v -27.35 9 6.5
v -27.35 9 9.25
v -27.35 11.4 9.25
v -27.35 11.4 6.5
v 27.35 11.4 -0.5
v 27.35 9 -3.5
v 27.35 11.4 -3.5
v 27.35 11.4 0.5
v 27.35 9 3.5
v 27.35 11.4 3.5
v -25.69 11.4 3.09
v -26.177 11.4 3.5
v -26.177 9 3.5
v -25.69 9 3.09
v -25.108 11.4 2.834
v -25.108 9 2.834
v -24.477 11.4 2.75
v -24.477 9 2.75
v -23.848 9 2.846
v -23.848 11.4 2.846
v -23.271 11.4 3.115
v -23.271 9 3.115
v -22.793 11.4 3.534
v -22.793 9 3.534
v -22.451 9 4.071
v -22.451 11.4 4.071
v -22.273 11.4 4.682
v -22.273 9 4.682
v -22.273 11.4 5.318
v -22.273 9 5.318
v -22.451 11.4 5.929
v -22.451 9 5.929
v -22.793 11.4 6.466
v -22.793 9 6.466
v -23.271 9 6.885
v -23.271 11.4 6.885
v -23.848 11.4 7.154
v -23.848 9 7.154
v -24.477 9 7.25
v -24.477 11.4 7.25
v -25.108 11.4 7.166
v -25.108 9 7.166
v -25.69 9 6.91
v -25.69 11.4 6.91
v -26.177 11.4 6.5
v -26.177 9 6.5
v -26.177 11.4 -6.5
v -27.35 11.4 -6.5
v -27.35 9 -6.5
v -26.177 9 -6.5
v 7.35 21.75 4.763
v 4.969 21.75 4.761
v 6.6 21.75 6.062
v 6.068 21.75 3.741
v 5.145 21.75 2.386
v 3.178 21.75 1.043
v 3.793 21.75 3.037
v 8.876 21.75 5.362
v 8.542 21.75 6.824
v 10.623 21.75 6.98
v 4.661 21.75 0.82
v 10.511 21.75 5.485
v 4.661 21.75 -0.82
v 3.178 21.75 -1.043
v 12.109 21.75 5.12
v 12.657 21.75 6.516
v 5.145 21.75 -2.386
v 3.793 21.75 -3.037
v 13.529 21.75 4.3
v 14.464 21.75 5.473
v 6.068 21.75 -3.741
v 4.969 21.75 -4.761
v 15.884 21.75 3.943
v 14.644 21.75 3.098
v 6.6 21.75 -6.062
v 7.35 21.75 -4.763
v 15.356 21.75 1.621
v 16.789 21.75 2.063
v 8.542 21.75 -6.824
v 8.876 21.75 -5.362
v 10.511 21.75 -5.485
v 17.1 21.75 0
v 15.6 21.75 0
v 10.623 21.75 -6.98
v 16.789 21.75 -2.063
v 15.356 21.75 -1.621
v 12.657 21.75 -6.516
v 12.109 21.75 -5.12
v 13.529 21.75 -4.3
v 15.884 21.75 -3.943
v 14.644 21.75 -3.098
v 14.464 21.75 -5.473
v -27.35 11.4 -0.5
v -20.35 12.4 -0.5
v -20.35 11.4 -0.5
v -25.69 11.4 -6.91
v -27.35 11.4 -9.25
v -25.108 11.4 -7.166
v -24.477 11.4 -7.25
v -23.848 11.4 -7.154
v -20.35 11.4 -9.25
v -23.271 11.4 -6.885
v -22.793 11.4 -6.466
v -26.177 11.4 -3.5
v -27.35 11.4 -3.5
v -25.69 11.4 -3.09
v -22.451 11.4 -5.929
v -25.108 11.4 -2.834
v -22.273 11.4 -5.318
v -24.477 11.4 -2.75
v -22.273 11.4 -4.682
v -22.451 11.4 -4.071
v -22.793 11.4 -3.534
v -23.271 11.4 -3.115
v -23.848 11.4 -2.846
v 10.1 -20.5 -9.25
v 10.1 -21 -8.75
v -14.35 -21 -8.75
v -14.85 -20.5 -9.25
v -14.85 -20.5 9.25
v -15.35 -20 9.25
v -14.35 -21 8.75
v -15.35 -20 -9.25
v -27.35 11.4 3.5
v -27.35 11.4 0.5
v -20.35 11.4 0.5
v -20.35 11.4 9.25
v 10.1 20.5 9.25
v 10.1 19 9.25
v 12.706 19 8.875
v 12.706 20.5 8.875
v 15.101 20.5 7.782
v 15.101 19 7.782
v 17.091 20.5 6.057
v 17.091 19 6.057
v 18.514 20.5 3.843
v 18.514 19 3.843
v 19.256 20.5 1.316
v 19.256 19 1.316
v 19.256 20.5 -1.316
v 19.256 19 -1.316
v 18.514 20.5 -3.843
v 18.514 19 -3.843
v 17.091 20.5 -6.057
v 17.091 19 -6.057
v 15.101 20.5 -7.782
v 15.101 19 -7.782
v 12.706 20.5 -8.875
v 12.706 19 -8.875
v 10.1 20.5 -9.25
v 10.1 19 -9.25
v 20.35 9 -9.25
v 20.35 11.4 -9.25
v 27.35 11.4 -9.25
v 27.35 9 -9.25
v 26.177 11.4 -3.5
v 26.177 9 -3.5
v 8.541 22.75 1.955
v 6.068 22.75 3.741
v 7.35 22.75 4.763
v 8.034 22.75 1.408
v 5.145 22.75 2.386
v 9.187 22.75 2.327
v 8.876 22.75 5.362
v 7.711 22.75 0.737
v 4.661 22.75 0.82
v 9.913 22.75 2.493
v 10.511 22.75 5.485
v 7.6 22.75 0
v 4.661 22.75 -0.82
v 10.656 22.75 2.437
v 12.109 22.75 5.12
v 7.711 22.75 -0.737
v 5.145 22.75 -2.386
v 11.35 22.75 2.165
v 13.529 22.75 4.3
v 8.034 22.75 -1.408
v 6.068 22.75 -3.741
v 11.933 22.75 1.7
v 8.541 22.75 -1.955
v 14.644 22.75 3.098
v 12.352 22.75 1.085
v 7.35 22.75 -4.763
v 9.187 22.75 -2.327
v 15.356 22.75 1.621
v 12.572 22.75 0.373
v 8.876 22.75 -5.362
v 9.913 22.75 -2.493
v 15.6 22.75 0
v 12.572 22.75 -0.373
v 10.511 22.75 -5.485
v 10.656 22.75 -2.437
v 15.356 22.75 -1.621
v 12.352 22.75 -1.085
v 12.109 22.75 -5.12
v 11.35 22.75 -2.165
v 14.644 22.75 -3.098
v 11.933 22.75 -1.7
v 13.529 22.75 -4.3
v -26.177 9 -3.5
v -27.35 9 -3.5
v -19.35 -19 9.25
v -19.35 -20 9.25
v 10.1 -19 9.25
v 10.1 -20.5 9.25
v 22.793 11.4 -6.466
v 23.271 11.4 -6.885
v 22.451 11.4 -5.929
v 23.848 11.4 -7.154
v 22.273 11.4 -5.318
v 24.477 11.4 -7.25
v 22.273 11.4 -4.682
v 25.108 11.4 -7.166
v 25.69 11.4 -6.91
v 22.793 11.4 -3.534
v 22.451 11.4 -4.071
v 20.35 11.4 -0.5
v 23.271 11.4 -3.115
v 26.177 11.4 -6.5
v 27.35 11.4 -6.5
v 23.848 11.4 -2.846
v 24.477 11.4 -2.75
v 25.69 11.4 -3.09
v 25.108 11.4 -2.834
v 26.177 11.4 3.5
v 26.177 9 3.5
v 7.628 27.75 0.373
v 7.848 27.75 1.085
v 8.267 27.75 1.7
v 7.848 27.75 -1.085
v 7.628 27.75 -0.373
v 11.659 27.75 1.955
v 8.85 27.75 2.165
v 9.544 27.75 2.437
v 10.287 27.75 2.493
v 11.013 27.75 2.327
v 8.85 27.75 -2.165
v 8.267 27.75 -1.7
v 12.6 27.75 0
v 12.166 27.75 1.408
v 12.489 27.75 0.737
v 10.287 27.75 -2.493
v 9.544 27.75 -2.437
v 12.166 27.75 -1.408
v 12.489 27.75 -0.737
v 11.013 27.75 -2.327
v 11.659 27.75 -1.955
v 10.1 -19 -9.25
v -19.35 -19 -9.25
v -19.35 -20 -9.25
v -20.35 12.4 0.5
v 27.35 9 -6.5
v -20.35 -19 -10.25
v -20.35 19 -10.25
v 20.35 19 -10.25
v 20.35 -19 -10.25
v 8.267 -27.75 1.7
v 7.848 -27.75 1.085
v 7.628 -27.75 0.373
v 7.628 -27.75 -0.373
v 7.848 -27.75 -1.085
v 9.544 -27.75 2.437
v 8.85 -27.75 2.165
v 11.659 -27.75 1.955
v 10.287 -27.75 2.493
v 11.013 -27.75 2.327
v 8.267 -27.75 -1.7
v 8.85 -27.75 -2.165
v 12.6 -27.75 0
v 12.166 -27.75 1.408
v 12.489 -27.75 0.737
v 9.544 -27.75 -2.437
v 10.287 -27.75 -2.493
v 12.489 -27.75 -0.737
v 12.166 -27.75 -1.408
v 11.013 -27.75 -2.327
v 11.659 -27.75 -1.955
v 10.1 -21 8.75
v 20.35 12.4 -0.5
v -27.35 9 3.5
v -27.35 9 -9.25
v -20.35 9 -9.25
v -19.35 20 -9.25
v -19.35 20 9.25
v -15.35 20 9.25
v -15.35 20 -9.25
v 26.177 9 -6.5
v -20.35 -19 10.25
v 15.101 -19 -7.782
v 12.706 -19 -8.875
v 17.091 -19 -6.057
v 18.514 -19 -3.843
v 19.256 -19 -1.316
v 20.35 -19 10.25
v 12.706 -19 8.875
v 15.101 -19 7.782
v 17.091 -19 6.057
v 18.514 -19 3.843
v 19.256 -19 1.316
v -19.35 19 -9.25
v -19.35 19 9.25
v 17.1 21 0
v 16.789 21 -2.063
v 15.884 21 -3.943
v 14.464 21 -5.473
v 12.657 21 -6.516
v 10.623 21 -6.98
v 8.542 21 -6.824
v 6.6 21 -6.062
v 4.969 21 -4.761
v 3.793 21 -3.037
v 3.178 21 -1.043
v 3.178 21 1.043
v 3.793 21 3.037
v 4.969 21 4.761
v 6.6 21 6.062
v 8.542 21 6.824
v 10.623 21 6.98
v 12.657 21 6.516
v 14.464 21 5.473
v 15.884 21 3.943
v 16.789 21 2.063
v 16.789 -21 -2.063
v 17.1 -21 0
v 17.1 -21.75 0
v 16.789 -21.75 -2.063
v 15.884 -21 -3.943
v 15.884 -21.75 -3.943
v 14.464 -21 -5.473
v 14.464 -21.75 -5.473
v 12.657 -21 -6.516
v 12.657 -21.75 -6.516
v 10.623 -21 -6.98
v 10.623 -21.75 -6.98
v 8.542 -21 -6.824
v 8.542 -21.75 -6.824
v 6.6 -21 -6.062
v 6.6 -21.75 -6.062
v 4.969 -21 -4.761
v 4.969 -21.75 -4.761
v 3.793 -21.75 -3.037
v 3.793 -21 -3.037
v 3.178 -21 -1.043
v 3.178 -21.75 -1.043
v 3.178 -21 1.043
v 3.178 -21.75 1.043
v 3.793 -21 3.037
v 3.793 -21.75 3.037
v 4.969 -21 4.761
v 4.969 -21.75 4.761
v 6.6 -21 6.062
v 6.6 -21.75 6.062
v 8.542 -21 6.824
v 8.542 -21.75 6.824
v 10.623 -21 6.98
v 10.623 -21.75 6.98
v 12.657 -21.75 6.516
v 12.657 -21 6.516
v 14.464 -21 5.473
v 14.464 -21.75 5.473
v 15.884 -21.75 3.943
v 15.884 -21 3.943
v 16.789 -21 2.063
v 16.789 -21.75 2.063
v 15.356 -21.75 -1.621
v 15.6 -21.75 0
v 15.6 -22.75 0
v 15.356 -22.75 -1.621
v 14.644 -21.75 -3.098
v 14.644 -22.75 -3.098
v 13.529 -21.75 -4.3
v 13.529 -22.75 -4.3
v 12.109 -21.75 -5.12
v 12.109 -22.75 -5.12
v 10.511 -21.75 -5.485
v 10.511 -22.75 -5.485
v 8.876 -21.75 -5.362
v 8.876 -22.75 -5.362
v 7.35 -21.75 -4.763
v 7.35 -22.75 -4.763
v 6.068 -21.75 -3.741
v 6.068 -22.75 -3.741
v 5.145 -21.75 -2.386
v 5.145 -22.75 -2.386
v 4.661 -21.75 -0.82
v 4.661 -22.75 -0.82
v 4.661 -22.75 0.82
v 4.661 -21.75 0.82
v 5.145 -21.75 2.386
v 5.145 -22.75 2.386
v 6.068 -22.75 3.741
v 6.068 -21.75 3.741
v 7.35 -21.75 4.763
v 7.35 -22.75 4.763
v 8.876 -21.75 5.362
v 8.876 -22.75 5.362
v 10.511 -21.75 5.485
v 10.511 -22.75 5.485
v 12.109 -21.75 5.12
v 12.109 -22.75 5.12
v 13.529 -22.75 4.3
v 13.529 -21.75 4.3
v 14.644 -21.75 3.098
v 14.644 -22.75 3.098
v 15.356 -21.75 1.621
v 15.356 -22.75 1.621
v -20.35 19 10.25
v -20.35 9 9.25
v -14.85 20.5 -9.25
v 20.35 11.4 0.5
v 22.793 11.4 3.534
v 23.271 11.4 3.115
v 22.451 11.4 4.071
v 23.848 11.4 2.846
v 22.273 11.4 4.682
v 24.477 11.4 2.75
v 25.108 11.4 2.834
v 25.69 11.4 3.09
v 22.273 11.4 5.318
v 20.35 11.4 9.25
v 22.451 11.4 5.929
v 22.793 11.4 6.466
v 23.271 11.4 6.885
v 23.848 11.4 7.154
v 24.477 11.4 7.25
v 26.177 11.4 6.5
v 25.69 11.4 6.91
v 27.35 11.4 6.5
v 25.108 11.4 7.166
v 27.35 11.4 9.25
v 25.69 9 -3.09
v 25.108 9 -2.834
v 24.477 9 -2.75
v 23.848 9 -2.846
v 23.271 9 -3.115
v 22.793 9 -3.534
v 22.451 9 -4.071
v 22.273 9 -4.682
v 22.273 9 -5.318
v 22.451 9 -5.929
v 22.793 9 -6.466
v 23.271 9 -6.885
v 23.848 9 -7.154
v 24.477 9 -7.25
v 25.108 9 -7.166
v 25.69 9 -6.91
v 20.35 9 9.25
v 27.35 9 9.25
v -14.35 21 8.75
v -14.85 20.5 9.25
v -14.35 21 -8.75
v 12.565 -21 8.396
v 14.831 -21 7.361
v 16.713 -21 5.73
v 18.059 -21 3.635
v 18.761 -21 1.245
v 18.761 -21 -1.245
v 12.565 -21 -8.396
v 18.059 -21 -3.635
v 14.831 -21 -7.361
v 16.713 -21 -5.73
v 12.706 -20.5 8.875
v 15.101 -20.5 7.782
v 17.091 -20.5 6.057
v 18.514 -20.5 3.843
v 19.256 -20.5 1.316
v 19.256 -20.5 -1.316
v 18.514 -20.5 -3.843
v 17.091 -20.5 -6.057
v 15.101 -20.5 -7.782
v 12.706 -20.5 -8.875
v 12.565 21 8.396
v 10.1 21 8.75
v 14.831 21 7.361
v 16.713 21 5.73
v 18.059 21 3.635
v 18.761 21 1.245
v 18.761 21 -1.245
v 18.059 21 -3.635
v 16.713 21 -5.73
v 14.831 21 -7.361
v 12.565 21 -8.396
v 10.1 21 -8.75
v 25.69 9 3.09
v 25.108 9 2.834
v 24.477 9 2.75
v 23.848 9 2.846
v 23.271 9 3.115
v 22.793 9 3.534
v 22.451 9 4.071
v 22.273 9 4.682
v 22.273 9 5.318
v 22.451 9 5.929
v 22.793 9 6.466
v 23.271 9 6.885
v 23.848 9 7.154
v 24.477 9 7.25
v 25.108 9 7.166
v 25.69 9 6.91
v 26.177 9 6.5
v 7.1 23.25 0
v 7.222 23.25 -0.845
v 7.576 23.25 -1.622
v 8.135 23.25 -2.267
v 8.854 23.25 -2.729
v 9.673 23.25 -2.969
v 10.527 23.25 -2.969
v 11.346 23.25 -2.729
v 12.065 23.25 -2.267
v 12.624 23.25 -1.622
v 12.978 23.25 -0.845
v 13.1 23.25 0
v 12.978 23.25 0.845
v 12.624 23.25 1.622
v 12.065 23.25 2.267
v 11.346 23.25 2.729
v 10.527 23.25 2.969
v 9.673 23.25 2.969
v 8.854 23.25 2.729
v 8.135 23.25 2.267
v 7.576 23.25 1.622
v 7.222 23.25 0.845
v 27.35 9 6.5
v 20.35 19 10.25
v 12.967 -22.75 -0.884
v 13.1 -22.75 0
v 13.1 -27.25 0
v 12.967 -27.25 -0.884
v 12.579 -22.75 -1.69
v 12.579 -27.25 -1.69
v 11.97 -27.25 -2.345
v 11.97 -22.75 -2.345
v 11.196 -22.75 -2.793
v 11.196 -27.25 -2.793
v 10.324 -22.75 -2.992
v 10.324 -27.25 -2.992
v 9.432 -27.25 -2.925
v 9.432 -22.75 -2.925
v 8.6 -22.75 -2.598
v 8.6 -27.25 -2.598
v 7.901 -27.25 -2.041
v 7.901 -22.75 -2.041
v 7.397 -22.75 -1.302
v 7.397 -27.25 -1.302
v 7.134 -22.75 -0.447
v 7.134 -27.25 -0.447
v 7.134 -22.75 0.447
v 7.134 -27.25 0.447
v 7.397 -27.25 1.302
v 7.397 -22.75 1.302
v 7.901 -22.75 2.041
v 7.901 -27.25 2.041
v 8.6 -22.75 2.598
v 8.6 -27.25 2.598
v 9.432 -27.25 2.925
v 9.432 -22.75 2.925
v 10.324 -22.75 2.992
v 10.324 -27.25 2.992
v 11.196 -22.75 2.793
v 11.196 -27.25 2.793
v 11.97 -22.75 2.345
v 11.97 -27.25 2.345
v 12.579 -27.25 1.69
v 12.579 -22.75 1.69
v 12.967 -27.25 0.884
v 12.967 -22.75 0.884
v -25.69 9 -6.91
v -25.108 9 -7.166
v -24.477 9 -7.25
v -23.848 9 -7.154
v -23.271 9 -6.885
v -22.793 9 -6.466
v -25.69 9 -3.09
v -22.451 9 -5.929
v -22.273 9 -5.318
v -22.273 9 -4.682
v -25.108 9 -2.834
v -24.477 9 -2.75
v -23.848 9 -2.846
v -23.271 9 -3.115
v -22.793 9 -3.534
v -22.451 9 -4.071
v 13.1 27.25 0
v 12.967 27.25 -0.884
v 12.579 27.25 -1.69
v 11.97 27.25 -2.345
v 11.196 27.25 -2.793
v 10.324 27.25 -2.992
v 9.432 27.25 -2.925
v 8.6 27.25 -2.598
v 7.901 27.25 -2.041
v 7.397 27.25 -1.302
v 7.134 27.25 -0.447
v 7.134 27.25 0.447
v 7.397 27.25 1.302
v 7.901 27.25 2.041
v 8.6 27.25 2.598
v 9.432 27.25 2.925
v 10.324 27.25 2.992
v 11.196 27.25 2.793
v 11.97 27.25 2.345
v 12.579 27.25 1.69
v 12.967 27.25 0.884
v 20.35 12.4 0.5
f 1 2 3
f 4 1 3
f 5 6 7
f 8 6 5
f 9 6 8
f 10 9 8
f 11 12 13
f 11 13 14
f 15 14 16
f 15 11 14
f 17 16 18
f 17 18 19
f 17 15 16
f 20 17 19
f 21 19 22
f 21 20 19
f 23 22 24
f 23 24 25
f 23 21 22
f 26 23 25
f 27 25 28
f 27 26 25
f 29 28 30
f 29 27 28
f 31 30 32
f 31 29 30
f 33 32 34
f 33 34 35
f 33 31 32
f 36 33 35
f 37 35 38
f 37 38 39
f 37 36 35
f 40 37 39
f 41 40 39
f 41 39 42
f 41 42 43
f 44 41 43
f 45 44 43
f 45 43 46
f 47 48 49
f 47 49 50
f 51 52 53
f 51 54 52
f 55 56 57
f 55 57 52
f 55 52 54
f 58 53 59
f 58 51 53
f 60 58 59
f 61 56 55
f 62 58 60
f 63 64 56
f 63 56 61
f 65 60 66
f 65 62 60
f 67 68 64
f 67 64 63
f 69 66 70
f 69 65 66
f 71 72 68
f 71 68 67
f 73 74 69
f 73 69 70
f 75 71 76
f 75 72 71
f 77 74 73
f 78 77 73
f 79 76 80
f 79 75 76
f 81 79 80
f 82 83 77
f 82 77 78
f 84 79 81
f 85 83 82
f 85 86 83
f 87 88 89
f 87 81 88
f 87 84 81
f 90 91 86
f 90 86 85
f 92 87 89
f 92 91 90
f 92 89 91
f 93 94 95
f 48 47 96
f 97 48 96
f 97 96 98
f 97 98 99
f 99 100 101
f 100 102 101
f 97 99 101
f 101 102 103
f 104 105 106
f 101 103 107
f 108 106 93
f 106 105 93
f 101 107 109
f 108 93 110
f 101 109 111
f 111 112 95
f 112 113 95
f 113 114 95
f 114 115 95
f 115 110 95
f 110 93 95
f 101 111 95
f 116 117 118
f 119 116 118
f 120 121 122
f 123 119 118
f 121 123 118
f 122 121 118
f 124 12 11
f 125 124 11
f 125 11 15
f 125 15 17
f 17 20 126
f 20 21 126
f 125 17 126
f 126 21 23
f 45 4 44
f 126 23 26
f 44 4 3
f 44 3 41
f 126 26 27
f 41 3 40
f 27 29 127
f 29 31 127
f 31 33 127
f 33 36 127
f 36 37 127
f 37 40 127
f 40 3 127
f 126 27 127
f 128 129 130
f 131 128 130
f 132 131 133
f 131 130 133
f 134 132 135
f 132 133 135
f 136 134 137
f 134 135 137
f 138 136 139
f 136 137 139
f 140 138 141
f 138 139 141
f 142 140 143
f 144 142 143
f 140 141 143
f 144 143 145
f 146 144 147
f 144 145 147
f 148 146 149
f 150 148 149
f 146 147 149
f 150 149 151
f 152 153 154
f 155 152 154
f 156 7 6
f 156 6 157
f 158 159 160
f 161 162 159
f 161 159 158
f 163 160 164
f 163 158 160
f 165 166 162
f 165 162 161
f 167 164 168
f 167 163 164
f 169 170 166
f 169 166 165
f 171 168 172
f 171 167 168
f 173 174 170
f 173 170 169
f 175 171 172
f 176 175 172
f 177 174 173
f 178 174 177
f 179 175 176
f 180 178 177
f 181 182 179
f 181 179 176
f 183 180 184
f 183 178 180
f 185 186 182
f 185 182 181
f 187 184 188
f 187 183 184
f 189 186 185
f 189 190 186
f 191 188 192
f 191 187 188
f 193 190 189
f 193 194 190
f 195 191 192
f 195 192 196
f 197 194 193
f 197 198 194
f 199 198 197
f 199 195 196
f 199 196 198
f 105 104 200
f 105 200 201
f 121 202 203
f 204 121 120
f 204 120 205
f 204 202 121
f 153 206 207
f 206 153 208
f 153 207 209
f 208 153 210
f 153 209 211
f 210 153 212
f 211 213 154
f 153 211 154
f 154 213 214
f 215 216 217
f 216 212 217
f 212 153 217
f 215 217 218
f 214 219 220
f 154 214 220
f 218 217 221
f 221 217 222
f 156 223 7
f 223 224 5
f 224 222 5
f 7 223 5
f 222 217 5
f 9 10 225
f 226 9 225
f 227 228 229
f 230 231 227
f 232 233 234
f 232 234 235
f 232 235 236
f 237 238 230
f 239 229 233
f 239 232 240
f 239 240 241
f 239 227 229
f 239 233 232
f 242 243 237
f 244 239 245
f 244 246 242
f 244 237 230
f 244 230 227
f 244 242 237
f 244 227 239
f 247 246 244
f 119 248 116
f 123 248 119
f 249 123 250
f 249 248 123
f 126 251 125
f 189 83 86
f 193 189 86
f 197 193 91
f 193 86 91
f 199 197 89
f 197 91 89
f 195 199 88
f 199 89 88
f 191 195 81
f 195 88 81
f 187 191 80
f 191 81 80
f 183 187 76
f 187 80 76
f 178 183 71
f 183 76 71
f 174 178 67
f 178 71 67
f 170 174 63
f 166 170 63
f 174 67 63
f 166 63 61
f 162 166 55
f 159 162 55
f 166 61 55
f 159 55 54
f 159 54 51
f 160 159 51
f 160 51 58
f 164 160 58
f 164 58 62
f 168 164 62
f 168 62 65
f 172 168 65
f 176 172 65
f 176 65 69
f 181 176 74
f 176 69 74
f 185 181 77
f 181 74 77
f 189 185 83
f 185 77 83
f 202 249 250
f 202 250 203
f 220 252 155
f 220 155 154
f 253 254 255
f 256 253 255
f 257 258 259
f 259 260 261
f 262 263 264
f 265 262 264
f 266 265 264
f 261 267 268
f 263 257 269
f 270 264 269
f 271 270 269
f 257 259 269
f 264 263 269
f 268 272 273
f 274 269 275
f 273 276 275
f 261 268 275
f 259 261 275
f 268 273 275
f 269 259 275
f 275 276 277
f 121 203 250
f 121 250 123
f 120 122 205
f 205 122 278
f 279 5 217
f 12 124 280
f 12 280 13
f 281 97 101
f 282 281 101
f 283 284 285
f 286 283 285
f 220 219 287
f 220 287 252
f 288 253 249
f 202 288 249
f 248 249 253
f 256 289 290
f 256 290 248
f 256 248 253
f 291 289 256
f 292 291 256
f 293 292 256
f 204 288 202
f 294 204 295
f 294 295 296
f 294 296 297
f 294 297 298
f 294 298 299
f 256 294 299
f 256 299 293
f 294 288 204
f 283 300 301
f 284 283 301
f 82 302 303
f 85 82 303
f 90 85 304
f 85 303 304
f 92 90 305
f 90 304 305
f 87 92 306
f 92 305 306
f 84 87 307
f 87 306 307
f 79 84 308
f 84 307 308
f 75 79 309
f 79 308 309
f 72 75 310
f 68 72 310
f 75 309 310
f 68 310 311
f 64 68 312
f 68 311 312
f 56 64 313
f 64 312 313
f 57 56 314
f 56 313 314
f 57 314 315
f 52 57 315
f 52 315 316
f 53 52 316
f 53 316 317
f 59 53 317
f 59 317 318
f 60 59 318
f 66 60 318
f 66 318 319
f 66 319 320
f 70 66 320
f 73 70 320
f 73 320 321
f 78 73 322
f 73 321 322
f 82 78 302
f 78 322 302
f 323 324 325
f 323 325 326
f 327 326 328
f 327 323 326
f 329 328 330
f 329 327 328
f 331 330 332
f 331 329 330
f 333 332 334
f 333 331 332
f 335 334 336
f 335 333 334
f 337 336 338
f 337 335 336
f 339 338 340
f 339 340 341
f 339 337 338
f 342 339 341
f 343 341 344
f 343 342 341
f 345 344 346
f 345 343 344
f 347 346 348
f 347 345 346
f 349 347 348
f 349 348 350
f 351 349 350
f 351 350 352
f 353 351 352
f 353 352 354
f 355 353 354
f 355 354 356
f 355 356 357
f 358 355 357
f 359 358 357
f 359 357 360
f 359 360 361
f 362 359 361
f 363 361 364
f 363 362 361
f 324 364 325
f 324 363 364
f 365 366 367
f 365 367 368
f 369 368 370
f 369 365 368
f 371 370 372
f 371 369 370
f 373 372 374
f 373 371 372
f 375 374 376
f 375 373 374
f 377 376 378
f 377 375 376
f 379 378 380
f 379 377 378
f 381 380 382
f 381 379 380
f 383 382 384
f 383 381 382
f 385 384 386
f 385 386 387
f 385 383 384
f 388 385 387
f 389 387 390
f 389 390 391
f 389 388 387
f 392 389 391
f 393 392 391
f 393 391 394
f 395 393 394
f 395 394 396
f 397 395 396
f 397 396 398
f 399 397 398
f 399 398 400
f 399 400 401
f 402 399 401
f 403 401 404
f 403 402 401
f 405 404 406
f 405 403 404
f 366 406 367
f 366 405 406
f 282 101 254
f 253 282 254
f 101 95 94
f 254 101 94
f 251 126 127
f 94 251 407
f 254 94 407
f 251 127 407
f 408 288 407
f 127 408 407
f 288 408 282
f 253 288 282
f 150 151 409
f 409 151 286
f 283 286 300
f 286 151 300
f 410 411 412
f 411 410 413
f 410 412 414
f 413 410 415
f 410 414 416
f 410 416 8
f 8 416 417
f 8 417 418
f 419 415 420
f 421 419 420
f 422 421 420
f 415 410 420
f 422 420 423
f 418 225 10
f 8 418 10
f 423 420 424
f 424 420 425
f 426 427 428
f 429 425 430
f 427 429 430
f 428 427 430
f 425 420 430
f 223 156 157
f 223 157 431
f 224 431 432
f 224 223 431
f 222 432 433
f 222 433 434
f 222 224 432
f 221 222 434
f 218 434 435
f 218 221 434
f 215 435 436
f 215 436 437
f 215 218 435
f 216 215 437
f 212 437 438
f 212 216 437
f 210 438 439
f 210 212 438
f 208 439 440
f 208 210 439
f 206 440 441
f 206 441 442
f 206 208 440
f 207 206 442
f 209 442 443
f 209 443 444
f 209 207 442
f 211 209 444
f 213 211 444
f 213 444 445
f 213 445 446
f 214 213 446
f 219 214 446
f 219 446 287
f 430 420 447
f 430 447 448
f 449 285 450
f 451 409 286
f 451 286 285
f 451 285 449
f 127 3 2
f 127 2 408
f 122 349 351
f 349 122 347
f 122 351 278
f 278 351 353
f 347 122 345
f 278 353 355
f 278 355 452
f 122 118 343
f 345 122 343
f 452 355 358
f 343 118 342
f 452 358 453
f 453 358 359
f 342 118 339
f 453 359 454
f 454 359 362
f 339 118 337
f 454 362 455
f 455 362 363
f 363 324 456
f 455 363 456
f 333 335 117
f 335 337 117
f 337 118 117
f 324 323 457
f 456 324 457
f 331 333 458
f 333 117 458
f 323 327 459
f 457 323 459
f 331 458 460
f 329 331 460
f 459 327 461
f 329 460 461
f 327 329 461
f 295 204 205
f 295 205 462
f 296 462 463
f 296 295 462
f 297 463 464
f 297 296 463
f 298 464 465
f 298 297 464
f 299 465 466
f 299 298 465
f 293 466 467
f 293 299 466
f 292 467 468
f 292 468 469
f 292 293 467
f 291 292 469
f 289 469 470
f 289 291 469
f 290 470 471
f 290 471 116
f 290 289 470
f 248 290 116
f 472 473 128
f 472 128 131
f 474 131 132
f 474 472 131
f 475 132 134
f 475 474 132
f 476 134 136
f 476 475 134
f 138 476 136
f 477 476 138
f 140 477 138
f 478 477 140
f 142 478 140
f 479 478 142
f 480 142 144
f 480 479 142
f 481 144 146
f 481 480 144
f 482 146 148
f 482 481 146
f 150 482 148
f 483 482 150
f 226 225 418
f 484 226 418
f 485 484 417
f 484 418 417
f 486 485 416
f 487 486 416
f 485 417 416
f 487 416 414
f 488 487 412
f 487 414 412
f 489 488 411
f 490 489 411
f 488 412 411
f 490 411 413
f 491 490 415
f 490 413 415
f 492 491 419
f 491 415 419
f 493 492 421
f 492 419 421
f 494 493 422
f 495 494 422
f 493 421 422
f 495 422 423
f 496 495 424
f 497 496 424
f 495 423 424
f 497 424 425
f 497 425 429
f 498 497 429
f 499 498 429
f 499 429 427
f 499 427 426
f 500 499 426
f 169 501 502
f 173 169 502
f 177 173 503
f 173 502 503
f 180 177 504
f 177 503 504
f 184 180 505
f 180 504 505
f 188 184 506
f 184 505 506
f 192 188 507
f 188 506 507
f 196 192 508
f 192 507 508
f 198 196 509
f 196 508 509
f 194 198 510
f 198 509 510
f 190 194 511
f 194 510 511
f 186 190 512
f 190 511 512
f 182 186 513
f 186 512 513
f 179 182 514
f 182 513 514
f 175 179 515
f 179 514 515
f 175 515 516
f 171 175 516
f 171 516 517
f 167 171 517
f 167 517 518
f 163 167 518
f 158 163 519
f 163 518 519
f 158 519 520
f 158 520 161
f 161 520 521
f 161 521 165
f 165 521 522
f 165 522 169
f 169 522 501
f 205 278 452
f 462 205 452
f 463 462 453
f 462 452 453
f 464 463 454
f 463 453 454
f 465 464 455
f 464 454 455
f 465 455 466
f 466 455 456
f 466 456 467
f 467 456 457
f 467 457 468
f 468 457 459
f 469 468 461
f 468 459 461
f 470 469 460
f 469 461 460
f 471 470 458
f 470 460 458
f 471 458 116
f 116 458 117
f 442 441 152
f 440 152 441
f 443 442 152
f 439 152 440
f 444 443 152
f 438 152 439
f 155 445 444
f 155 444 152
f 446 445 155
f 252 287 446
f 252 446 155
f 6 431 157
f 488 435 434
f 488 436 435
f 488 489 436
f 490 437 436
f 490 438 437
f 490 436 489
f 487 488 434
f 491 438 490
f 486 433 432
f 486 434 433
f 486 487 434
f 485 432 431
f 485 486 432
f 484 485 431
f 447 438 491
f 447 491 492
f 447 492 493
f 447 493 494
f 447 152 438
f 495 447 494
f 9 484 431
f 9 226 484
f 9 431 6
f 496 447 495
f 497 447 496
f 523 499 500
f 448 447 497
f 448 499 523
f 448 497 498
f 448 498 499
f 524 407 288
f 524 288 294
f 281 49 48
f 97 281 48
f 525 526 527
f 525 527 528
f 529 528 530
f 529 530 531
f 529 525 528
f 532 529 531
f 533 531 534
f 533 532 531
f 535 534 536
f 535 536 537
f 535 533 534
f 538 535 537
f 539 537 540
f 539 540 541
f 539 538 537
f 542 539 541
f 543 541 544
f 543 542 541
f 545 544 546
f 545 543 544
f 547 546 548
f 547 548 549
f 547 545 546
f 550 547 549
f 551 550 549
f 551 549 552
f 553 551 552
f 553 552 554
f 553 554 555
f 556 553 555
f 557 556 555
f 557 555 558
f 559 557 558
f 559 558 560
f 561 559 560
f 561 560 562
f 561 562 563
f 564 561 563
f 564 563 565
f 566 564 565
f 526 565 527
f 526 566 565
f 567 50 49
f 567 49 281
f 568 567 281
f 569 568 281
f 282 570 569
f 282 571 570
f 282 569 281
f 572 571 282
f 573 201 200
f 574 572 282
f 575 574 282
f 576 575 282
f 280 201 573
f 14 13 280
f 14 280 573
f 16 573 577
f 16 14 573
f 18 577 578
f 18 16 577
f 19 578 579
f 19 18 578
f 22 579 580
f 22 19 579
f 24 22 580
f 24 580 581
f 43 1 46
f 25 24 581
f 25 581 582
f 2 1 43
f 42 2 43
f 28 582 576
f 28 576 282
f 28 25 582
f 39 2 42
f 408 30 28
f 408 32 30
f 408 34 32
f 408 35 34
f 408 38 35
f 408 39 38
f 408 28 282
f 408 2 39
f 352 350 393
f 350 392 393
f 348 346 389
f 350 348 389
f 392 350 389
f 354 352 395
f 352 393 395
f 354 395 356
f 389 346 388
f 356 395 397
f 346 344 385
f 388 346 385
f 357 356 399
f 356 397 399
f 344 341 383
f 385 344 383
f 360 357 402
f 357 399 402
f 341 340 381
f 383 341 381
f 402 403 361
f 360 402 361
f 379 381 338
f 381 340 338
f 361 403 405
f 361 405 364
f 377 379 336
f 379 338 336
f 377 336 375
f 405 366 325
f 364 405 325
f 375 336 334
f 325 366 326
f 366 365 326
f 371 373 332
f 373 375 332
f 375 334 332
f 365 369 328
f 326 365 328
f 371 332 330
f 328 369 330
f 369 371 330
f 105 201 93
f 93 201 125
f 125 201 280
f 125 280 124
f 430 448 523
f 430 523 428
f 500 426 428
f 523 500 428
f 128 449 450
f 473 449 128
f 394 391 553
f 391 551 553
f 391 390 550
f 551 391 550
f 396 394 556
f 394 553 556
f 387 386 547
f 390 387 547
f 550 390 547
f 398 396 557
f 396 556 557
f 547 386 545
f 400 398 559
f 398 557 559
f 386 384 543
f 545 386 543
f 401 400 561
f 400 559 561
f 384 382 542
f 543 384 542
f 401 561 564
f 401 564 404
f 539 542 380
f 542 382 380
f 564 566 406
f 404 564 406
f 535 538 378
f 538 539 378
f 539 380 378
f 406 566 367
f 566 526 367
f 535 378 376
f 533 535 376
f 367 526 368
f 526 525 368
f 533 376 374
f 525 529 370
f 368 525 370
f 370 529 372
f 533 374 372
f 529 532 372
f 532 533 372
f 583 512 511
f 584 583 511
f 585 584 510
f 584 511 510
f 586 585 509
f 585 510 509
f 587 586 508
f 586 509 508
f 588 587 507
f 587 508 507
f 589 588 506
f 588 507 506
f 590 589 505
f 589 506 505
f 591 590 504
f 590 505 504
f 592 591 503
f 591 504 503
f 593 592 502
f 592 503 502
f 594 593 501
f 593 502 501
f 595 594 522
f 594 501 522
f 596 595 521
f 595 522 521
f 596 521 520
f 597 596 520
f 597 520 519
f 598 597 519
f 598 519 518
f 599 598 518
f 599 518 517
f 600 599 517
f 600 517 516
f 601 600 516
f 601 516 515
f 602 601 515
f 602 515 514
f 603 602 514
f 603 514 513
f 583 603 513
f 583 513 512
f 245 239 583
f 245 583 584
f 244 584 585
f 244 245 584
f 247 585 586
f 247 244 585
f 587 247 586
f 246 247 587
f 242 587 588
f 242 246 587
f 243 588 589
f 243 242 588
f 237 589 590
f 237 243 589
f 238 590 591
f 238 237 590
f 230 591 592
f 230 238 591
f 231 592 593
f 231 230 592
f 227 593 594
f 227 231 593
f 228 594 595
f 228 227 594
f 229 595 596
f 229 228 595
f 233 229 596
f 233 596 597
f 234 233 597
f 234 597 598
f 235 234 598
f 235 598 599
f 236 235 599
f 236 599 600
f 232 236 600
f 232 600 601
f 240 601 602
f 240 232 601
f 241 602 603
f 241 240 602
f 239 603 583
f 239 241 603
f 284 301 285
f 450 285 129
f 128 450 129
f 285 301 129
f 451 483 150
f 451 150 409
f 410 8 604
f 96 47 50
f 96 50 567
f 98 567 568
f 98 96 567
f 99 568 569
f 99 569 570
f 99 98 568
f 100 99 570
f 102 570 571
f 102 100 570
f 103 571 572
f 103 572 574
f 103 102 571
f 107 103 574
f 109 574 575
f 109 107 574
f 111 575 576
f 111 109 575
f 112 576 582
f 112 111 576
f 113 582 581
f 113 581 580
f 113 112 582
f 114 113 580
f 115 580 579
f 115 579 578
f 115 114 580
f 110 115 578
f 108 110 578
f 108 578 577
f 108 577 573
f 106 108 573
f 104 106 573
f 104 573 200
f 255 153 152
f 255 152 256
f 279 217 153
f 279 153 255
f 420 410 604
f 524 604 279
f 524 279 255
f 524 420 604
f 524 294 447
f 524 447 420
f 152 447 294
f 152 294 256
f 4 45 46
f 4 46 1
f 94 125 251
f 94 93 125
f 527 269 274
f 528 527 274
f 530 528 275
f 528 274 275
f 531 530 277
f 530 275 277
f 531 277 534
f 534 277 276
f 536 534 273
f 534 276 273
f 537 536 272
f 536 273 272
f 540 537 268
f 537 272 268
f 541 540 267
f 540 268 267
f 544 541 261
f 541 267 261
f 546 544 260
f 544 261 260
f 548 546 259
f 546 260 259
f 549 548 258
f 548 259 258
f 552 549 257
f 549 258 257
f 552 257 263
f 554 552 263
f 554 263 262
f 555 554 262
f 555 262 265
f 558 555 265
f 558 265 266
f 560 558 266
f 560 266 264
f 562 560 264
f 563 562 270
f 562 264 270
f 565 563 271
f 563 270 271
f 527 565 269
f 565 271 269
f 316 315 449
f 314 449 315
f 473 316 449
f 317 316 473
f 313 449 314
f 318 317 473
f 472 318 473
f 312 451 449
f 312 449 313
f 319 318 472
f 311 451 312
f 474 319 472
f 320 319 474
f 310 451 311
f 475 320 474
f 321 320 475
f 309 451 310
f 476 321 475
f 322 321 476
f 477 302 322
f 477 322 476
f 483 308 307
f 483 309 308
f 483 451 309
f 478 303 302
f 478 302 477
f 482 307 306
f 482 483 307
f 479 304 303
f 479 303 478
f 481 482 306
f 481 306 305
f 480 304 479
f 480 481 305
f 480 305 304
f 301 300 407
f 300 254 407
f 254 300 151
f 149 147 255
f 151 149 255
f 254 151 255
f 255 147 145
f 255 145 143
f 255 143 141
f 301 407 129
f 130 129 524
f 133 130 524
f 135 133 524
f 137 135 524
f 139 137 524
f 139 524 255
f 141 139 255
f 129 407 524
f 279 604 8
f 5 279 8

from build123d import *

# Parameters (mm, degrees)
CROQUIS1_W               = 40.7
CROQUIS1_H               = 38
SALIENTE_EXTRUIR1_DEPTH  = 10.25
CROQUIS2_W               = 7
CROQUIS2_H               = 2.4
SALIENTE_EXTRUIR2_DEPTH  = 18.5
SALIENTE_EXTRUIR3_DEPTH  = 0.5
CORTAR_EXTRUIR1_DEPTH    = 2.4
SALIENTE_EXTRUIR4_DEPTH  = 2
CORTAR_EXTRUIR3_START    = -18.5
CORTAR_EXTRUIR3_DEPTH    = 18.5
CROQUIS10_R              = 7
SALIENTE_EXTRUIR5_DEPTH  = 0.75
CROQUIS11_R              = 5.5
SALIENTE_EXTRUIR6_DEPTH  = 1
CROQUIS12_R              = 3
SALIENTE_EXTRUIR7_DEPTH  = 5
CHAFL_N2_SIZE            = 0.5
CHAFL_N2_OF_MIRROR1_SIZE = 0.5


with BuildPart() as part:
    # Croquis1 → Saliente-Extruir1 (new body, symmetric)
    with BuildSketch(Plane.XY):
        Rectangle(CROQUIS1_W, CROQUIS1_H)
    extrude(amount=SALIENTE_EXTRUIR1_DEPTH, both=True)

    # Croquis2 → Saliente-Extruir2 (add)
    with BuildSketch(Plane.XY.offset(9.25)):
        with Locations((-23.85, 10.2)):
            Rectangle(CROQUIS2_W, CROQUIS2_H)
        with Locations((23.85, 10.2)):
            Rectangle(CROQUIS2_W, CROQUIS2_H)
    extrude(amount=-SALIENTE_EXTRUIR2_DEPTH)

    # Croquis3 → Saliente-Extruir3 (add, symmetric)
    with BuildSketch(Plane.XY):
        Polygon((-20.35, 12.4), (-20.35, 11.4), (-27.35, 11.4), align=None)
        Polygon((20.35, 12.4), (27.35, 11.4), (20.35, 11.4), align=None)
    extrude(amount=SALIENTE_EXTRUIR3_DEPTH, both=True)

    # Croquis4 → Cortar-Extruir1 (cut)
    with BuildSketch(Plane(origin=(0, 11.4, 0), x_dir=(1, 0, 0), z_dir=(0, 1, 0))):
        with BuildLine():
            Line((-27.35, 6.5), (-26.177050983, 6.5))
            ThreePointArc((-26.177050983, 6.5), (-22.25, 5), (-26.177050983, 3.5))
            Line((-26.177050983, 3.5), (-27.35, 3.5))
            Line((-27.35, 3.5), (-27.35, 6.5))
        make_face()
        with BuildLine():
            Line((-27.35, -3.5), (-26.177050983, -3.5))
            ThreePointArc((-26.177050983, -3.5), (-22.25, -5), (-26.177050983, -6.5))
            Line((-26.177050983, -6.5), (-27.35, -6.5))
            Line((-27.35, -6.5), (-27.35, -3.5))
        make_face()
        with BuildLine():
            Line((26.177050983, -6.5), (27.35, -6.5))
            Line((27.35, -6.5), (27.35, -3.5))
            Line((27.35, -3.5), (26.177050983, -3.5))
            ThreePointArc((26.177050983, -3.5), (22.25, -5), (26.177050983, -6.5))
        make_face()
        with BuildLine():
            Line((27.35, 3.5), (26.177050983, 3.5))
            ThreePointArc((26.177050983, 3.5), (22.25, 5), (26.177050983, 6.5))
            Line((26.177050983, 6.5), (27.35, 6.5))
            Line((27.35, 6.5), (27.35, 3.5))
        make_face()
    extrude(amount=-CORTAR_EXTRUIR1_DEPTH, mode=Mode.SUBTRACT)

    # Croquis6 → Saliente-Extruir4 (add)
    with BuildSketch(Plane(origin=(0, 19, 0), x_dir=(1, 0, 0), z_dir=(0, 1, 0))):
        with BuildLine():
            Line((10.1, 9.25), (-19.35, 9.25))
            Line((-19.35, 9.25), (-19.35, -9.25))
            Line((-19.35, -9.25), (10.1, -9.25))
            ThreePointArc((10.1, -9.25), (19.35, 0), (10.1, 9.25))
        make_face()
    saliente_extruir4 = extrude(amount=SALIENTE_EXTRUIR4_DEPTH)

    # Croquis9 → Cortar-Extruir3 (cut)
    with BuildSketch(Plane.XY.offset(9.25).offset(CORTAR_EXTRUIR3_START)):
        Polygon((-19.35, 21), (-19.35, 20), (-15.35, 20), (-14.35, 21), align=None)
    cortar_extruir3 = extrude(amount=CORTAR_EXTRUIR3_DEPTH, mode=Mode.SUBTRACT)

    # Croquis10 → Saliente-Extruir5 (add)
    with BuildSketch(Plane(origin=(0, 21, 0), x_dir=(1, 0, 0), z_dir=(0, 1, 0))):
        with Locations((10.1, 0)):
            Circle(CROQUIS10_R)
    saliente_extruir5 = extrude(amount=SALIENTE_EXTRUIR5_DEPTH)

    # Croquis11 → Saliente-Extruir6 (add)
    with BuildSketch(Plane(origin=(0, 21.75, 0), x_dir=(1, 0, 0), z_dir=(0, 1, 0))):
        with Locations((10.1, 0)):
            Circle(CROQUIS11_R)
    saliente_extruir6 = extrude(amount=SALIENTE_EXTRUIR6_DEPTH)

    # Croquis12 → Saliente-Extruir7 (add)
    with BuildSketch(Plane(origin=(0, 22.75, 0), x_dir=(1, 0, 0), z_dir=(0, 1, 0))):
        with Locations((10.1, 0)):
            Circle(CROQUIS12_R)
    saliente_extruir7 = extrude(amount=SALIENTE_EXTRUIR7_DEPTH)

    # Chaflán2
    chafl_n2_edges = [part.edges().sort_by_distance(p)[0] for p in [
        (19.35, 21, 0),
        (-2.125, 21, -9.25),
        (-2.125, 21, 9.25),
        (7.1, 27.75, 0),
    ]]
    chamfer(chafl_n2_edges, length=CHAFL_N2_SIZE)

    # Croquis13 → Cortar-Revolución1 (revolve, cut)
    with BuildSketch(Plane.XY):
        Polygon((7.1, 23.25), (7.1, 22.75), (7.6, 22.75), align=None)
    revolve(axis=Axis((10.1, 27.75, 0), (0, -1, 0)), mode=Mode.SUBTRACT)

    # Mirror1: Saliente-Extruir4, Cortar-Extruir3, Saliente-Extruir5, Saliente-Extruir6, Saliente-Extruir7 across plane
    add(saliente_extruir4.mirror(Plane.ZX))
    add(cortar_extruir3.mirror(Plane.ZX), mode=Mode.SUBTRACT)
    add(saliente_extruir5.mirror(Plane.ZX))
    add(saliente_extruir6.mirror(Plane.ZX))
    add(saliente_extruir7.mirror(Plane.ZX))

    # Chaflán2 of Mirror1
    chafl_n2_of_mirror1_edges = [part.edges().sort_by_distance(p)[0] for p in [
        (19.35, -21, 0),
        (-2.125, -21, -9.25),
        (-2.125, -21, 9.25),
        (7.1, -27.75, 0),
    ]]
    chamfer(chafl_n2_of_mirror1_edges, length=CHAFL_N2_OF_MIRROR1_SIZE)


solid = part.part
